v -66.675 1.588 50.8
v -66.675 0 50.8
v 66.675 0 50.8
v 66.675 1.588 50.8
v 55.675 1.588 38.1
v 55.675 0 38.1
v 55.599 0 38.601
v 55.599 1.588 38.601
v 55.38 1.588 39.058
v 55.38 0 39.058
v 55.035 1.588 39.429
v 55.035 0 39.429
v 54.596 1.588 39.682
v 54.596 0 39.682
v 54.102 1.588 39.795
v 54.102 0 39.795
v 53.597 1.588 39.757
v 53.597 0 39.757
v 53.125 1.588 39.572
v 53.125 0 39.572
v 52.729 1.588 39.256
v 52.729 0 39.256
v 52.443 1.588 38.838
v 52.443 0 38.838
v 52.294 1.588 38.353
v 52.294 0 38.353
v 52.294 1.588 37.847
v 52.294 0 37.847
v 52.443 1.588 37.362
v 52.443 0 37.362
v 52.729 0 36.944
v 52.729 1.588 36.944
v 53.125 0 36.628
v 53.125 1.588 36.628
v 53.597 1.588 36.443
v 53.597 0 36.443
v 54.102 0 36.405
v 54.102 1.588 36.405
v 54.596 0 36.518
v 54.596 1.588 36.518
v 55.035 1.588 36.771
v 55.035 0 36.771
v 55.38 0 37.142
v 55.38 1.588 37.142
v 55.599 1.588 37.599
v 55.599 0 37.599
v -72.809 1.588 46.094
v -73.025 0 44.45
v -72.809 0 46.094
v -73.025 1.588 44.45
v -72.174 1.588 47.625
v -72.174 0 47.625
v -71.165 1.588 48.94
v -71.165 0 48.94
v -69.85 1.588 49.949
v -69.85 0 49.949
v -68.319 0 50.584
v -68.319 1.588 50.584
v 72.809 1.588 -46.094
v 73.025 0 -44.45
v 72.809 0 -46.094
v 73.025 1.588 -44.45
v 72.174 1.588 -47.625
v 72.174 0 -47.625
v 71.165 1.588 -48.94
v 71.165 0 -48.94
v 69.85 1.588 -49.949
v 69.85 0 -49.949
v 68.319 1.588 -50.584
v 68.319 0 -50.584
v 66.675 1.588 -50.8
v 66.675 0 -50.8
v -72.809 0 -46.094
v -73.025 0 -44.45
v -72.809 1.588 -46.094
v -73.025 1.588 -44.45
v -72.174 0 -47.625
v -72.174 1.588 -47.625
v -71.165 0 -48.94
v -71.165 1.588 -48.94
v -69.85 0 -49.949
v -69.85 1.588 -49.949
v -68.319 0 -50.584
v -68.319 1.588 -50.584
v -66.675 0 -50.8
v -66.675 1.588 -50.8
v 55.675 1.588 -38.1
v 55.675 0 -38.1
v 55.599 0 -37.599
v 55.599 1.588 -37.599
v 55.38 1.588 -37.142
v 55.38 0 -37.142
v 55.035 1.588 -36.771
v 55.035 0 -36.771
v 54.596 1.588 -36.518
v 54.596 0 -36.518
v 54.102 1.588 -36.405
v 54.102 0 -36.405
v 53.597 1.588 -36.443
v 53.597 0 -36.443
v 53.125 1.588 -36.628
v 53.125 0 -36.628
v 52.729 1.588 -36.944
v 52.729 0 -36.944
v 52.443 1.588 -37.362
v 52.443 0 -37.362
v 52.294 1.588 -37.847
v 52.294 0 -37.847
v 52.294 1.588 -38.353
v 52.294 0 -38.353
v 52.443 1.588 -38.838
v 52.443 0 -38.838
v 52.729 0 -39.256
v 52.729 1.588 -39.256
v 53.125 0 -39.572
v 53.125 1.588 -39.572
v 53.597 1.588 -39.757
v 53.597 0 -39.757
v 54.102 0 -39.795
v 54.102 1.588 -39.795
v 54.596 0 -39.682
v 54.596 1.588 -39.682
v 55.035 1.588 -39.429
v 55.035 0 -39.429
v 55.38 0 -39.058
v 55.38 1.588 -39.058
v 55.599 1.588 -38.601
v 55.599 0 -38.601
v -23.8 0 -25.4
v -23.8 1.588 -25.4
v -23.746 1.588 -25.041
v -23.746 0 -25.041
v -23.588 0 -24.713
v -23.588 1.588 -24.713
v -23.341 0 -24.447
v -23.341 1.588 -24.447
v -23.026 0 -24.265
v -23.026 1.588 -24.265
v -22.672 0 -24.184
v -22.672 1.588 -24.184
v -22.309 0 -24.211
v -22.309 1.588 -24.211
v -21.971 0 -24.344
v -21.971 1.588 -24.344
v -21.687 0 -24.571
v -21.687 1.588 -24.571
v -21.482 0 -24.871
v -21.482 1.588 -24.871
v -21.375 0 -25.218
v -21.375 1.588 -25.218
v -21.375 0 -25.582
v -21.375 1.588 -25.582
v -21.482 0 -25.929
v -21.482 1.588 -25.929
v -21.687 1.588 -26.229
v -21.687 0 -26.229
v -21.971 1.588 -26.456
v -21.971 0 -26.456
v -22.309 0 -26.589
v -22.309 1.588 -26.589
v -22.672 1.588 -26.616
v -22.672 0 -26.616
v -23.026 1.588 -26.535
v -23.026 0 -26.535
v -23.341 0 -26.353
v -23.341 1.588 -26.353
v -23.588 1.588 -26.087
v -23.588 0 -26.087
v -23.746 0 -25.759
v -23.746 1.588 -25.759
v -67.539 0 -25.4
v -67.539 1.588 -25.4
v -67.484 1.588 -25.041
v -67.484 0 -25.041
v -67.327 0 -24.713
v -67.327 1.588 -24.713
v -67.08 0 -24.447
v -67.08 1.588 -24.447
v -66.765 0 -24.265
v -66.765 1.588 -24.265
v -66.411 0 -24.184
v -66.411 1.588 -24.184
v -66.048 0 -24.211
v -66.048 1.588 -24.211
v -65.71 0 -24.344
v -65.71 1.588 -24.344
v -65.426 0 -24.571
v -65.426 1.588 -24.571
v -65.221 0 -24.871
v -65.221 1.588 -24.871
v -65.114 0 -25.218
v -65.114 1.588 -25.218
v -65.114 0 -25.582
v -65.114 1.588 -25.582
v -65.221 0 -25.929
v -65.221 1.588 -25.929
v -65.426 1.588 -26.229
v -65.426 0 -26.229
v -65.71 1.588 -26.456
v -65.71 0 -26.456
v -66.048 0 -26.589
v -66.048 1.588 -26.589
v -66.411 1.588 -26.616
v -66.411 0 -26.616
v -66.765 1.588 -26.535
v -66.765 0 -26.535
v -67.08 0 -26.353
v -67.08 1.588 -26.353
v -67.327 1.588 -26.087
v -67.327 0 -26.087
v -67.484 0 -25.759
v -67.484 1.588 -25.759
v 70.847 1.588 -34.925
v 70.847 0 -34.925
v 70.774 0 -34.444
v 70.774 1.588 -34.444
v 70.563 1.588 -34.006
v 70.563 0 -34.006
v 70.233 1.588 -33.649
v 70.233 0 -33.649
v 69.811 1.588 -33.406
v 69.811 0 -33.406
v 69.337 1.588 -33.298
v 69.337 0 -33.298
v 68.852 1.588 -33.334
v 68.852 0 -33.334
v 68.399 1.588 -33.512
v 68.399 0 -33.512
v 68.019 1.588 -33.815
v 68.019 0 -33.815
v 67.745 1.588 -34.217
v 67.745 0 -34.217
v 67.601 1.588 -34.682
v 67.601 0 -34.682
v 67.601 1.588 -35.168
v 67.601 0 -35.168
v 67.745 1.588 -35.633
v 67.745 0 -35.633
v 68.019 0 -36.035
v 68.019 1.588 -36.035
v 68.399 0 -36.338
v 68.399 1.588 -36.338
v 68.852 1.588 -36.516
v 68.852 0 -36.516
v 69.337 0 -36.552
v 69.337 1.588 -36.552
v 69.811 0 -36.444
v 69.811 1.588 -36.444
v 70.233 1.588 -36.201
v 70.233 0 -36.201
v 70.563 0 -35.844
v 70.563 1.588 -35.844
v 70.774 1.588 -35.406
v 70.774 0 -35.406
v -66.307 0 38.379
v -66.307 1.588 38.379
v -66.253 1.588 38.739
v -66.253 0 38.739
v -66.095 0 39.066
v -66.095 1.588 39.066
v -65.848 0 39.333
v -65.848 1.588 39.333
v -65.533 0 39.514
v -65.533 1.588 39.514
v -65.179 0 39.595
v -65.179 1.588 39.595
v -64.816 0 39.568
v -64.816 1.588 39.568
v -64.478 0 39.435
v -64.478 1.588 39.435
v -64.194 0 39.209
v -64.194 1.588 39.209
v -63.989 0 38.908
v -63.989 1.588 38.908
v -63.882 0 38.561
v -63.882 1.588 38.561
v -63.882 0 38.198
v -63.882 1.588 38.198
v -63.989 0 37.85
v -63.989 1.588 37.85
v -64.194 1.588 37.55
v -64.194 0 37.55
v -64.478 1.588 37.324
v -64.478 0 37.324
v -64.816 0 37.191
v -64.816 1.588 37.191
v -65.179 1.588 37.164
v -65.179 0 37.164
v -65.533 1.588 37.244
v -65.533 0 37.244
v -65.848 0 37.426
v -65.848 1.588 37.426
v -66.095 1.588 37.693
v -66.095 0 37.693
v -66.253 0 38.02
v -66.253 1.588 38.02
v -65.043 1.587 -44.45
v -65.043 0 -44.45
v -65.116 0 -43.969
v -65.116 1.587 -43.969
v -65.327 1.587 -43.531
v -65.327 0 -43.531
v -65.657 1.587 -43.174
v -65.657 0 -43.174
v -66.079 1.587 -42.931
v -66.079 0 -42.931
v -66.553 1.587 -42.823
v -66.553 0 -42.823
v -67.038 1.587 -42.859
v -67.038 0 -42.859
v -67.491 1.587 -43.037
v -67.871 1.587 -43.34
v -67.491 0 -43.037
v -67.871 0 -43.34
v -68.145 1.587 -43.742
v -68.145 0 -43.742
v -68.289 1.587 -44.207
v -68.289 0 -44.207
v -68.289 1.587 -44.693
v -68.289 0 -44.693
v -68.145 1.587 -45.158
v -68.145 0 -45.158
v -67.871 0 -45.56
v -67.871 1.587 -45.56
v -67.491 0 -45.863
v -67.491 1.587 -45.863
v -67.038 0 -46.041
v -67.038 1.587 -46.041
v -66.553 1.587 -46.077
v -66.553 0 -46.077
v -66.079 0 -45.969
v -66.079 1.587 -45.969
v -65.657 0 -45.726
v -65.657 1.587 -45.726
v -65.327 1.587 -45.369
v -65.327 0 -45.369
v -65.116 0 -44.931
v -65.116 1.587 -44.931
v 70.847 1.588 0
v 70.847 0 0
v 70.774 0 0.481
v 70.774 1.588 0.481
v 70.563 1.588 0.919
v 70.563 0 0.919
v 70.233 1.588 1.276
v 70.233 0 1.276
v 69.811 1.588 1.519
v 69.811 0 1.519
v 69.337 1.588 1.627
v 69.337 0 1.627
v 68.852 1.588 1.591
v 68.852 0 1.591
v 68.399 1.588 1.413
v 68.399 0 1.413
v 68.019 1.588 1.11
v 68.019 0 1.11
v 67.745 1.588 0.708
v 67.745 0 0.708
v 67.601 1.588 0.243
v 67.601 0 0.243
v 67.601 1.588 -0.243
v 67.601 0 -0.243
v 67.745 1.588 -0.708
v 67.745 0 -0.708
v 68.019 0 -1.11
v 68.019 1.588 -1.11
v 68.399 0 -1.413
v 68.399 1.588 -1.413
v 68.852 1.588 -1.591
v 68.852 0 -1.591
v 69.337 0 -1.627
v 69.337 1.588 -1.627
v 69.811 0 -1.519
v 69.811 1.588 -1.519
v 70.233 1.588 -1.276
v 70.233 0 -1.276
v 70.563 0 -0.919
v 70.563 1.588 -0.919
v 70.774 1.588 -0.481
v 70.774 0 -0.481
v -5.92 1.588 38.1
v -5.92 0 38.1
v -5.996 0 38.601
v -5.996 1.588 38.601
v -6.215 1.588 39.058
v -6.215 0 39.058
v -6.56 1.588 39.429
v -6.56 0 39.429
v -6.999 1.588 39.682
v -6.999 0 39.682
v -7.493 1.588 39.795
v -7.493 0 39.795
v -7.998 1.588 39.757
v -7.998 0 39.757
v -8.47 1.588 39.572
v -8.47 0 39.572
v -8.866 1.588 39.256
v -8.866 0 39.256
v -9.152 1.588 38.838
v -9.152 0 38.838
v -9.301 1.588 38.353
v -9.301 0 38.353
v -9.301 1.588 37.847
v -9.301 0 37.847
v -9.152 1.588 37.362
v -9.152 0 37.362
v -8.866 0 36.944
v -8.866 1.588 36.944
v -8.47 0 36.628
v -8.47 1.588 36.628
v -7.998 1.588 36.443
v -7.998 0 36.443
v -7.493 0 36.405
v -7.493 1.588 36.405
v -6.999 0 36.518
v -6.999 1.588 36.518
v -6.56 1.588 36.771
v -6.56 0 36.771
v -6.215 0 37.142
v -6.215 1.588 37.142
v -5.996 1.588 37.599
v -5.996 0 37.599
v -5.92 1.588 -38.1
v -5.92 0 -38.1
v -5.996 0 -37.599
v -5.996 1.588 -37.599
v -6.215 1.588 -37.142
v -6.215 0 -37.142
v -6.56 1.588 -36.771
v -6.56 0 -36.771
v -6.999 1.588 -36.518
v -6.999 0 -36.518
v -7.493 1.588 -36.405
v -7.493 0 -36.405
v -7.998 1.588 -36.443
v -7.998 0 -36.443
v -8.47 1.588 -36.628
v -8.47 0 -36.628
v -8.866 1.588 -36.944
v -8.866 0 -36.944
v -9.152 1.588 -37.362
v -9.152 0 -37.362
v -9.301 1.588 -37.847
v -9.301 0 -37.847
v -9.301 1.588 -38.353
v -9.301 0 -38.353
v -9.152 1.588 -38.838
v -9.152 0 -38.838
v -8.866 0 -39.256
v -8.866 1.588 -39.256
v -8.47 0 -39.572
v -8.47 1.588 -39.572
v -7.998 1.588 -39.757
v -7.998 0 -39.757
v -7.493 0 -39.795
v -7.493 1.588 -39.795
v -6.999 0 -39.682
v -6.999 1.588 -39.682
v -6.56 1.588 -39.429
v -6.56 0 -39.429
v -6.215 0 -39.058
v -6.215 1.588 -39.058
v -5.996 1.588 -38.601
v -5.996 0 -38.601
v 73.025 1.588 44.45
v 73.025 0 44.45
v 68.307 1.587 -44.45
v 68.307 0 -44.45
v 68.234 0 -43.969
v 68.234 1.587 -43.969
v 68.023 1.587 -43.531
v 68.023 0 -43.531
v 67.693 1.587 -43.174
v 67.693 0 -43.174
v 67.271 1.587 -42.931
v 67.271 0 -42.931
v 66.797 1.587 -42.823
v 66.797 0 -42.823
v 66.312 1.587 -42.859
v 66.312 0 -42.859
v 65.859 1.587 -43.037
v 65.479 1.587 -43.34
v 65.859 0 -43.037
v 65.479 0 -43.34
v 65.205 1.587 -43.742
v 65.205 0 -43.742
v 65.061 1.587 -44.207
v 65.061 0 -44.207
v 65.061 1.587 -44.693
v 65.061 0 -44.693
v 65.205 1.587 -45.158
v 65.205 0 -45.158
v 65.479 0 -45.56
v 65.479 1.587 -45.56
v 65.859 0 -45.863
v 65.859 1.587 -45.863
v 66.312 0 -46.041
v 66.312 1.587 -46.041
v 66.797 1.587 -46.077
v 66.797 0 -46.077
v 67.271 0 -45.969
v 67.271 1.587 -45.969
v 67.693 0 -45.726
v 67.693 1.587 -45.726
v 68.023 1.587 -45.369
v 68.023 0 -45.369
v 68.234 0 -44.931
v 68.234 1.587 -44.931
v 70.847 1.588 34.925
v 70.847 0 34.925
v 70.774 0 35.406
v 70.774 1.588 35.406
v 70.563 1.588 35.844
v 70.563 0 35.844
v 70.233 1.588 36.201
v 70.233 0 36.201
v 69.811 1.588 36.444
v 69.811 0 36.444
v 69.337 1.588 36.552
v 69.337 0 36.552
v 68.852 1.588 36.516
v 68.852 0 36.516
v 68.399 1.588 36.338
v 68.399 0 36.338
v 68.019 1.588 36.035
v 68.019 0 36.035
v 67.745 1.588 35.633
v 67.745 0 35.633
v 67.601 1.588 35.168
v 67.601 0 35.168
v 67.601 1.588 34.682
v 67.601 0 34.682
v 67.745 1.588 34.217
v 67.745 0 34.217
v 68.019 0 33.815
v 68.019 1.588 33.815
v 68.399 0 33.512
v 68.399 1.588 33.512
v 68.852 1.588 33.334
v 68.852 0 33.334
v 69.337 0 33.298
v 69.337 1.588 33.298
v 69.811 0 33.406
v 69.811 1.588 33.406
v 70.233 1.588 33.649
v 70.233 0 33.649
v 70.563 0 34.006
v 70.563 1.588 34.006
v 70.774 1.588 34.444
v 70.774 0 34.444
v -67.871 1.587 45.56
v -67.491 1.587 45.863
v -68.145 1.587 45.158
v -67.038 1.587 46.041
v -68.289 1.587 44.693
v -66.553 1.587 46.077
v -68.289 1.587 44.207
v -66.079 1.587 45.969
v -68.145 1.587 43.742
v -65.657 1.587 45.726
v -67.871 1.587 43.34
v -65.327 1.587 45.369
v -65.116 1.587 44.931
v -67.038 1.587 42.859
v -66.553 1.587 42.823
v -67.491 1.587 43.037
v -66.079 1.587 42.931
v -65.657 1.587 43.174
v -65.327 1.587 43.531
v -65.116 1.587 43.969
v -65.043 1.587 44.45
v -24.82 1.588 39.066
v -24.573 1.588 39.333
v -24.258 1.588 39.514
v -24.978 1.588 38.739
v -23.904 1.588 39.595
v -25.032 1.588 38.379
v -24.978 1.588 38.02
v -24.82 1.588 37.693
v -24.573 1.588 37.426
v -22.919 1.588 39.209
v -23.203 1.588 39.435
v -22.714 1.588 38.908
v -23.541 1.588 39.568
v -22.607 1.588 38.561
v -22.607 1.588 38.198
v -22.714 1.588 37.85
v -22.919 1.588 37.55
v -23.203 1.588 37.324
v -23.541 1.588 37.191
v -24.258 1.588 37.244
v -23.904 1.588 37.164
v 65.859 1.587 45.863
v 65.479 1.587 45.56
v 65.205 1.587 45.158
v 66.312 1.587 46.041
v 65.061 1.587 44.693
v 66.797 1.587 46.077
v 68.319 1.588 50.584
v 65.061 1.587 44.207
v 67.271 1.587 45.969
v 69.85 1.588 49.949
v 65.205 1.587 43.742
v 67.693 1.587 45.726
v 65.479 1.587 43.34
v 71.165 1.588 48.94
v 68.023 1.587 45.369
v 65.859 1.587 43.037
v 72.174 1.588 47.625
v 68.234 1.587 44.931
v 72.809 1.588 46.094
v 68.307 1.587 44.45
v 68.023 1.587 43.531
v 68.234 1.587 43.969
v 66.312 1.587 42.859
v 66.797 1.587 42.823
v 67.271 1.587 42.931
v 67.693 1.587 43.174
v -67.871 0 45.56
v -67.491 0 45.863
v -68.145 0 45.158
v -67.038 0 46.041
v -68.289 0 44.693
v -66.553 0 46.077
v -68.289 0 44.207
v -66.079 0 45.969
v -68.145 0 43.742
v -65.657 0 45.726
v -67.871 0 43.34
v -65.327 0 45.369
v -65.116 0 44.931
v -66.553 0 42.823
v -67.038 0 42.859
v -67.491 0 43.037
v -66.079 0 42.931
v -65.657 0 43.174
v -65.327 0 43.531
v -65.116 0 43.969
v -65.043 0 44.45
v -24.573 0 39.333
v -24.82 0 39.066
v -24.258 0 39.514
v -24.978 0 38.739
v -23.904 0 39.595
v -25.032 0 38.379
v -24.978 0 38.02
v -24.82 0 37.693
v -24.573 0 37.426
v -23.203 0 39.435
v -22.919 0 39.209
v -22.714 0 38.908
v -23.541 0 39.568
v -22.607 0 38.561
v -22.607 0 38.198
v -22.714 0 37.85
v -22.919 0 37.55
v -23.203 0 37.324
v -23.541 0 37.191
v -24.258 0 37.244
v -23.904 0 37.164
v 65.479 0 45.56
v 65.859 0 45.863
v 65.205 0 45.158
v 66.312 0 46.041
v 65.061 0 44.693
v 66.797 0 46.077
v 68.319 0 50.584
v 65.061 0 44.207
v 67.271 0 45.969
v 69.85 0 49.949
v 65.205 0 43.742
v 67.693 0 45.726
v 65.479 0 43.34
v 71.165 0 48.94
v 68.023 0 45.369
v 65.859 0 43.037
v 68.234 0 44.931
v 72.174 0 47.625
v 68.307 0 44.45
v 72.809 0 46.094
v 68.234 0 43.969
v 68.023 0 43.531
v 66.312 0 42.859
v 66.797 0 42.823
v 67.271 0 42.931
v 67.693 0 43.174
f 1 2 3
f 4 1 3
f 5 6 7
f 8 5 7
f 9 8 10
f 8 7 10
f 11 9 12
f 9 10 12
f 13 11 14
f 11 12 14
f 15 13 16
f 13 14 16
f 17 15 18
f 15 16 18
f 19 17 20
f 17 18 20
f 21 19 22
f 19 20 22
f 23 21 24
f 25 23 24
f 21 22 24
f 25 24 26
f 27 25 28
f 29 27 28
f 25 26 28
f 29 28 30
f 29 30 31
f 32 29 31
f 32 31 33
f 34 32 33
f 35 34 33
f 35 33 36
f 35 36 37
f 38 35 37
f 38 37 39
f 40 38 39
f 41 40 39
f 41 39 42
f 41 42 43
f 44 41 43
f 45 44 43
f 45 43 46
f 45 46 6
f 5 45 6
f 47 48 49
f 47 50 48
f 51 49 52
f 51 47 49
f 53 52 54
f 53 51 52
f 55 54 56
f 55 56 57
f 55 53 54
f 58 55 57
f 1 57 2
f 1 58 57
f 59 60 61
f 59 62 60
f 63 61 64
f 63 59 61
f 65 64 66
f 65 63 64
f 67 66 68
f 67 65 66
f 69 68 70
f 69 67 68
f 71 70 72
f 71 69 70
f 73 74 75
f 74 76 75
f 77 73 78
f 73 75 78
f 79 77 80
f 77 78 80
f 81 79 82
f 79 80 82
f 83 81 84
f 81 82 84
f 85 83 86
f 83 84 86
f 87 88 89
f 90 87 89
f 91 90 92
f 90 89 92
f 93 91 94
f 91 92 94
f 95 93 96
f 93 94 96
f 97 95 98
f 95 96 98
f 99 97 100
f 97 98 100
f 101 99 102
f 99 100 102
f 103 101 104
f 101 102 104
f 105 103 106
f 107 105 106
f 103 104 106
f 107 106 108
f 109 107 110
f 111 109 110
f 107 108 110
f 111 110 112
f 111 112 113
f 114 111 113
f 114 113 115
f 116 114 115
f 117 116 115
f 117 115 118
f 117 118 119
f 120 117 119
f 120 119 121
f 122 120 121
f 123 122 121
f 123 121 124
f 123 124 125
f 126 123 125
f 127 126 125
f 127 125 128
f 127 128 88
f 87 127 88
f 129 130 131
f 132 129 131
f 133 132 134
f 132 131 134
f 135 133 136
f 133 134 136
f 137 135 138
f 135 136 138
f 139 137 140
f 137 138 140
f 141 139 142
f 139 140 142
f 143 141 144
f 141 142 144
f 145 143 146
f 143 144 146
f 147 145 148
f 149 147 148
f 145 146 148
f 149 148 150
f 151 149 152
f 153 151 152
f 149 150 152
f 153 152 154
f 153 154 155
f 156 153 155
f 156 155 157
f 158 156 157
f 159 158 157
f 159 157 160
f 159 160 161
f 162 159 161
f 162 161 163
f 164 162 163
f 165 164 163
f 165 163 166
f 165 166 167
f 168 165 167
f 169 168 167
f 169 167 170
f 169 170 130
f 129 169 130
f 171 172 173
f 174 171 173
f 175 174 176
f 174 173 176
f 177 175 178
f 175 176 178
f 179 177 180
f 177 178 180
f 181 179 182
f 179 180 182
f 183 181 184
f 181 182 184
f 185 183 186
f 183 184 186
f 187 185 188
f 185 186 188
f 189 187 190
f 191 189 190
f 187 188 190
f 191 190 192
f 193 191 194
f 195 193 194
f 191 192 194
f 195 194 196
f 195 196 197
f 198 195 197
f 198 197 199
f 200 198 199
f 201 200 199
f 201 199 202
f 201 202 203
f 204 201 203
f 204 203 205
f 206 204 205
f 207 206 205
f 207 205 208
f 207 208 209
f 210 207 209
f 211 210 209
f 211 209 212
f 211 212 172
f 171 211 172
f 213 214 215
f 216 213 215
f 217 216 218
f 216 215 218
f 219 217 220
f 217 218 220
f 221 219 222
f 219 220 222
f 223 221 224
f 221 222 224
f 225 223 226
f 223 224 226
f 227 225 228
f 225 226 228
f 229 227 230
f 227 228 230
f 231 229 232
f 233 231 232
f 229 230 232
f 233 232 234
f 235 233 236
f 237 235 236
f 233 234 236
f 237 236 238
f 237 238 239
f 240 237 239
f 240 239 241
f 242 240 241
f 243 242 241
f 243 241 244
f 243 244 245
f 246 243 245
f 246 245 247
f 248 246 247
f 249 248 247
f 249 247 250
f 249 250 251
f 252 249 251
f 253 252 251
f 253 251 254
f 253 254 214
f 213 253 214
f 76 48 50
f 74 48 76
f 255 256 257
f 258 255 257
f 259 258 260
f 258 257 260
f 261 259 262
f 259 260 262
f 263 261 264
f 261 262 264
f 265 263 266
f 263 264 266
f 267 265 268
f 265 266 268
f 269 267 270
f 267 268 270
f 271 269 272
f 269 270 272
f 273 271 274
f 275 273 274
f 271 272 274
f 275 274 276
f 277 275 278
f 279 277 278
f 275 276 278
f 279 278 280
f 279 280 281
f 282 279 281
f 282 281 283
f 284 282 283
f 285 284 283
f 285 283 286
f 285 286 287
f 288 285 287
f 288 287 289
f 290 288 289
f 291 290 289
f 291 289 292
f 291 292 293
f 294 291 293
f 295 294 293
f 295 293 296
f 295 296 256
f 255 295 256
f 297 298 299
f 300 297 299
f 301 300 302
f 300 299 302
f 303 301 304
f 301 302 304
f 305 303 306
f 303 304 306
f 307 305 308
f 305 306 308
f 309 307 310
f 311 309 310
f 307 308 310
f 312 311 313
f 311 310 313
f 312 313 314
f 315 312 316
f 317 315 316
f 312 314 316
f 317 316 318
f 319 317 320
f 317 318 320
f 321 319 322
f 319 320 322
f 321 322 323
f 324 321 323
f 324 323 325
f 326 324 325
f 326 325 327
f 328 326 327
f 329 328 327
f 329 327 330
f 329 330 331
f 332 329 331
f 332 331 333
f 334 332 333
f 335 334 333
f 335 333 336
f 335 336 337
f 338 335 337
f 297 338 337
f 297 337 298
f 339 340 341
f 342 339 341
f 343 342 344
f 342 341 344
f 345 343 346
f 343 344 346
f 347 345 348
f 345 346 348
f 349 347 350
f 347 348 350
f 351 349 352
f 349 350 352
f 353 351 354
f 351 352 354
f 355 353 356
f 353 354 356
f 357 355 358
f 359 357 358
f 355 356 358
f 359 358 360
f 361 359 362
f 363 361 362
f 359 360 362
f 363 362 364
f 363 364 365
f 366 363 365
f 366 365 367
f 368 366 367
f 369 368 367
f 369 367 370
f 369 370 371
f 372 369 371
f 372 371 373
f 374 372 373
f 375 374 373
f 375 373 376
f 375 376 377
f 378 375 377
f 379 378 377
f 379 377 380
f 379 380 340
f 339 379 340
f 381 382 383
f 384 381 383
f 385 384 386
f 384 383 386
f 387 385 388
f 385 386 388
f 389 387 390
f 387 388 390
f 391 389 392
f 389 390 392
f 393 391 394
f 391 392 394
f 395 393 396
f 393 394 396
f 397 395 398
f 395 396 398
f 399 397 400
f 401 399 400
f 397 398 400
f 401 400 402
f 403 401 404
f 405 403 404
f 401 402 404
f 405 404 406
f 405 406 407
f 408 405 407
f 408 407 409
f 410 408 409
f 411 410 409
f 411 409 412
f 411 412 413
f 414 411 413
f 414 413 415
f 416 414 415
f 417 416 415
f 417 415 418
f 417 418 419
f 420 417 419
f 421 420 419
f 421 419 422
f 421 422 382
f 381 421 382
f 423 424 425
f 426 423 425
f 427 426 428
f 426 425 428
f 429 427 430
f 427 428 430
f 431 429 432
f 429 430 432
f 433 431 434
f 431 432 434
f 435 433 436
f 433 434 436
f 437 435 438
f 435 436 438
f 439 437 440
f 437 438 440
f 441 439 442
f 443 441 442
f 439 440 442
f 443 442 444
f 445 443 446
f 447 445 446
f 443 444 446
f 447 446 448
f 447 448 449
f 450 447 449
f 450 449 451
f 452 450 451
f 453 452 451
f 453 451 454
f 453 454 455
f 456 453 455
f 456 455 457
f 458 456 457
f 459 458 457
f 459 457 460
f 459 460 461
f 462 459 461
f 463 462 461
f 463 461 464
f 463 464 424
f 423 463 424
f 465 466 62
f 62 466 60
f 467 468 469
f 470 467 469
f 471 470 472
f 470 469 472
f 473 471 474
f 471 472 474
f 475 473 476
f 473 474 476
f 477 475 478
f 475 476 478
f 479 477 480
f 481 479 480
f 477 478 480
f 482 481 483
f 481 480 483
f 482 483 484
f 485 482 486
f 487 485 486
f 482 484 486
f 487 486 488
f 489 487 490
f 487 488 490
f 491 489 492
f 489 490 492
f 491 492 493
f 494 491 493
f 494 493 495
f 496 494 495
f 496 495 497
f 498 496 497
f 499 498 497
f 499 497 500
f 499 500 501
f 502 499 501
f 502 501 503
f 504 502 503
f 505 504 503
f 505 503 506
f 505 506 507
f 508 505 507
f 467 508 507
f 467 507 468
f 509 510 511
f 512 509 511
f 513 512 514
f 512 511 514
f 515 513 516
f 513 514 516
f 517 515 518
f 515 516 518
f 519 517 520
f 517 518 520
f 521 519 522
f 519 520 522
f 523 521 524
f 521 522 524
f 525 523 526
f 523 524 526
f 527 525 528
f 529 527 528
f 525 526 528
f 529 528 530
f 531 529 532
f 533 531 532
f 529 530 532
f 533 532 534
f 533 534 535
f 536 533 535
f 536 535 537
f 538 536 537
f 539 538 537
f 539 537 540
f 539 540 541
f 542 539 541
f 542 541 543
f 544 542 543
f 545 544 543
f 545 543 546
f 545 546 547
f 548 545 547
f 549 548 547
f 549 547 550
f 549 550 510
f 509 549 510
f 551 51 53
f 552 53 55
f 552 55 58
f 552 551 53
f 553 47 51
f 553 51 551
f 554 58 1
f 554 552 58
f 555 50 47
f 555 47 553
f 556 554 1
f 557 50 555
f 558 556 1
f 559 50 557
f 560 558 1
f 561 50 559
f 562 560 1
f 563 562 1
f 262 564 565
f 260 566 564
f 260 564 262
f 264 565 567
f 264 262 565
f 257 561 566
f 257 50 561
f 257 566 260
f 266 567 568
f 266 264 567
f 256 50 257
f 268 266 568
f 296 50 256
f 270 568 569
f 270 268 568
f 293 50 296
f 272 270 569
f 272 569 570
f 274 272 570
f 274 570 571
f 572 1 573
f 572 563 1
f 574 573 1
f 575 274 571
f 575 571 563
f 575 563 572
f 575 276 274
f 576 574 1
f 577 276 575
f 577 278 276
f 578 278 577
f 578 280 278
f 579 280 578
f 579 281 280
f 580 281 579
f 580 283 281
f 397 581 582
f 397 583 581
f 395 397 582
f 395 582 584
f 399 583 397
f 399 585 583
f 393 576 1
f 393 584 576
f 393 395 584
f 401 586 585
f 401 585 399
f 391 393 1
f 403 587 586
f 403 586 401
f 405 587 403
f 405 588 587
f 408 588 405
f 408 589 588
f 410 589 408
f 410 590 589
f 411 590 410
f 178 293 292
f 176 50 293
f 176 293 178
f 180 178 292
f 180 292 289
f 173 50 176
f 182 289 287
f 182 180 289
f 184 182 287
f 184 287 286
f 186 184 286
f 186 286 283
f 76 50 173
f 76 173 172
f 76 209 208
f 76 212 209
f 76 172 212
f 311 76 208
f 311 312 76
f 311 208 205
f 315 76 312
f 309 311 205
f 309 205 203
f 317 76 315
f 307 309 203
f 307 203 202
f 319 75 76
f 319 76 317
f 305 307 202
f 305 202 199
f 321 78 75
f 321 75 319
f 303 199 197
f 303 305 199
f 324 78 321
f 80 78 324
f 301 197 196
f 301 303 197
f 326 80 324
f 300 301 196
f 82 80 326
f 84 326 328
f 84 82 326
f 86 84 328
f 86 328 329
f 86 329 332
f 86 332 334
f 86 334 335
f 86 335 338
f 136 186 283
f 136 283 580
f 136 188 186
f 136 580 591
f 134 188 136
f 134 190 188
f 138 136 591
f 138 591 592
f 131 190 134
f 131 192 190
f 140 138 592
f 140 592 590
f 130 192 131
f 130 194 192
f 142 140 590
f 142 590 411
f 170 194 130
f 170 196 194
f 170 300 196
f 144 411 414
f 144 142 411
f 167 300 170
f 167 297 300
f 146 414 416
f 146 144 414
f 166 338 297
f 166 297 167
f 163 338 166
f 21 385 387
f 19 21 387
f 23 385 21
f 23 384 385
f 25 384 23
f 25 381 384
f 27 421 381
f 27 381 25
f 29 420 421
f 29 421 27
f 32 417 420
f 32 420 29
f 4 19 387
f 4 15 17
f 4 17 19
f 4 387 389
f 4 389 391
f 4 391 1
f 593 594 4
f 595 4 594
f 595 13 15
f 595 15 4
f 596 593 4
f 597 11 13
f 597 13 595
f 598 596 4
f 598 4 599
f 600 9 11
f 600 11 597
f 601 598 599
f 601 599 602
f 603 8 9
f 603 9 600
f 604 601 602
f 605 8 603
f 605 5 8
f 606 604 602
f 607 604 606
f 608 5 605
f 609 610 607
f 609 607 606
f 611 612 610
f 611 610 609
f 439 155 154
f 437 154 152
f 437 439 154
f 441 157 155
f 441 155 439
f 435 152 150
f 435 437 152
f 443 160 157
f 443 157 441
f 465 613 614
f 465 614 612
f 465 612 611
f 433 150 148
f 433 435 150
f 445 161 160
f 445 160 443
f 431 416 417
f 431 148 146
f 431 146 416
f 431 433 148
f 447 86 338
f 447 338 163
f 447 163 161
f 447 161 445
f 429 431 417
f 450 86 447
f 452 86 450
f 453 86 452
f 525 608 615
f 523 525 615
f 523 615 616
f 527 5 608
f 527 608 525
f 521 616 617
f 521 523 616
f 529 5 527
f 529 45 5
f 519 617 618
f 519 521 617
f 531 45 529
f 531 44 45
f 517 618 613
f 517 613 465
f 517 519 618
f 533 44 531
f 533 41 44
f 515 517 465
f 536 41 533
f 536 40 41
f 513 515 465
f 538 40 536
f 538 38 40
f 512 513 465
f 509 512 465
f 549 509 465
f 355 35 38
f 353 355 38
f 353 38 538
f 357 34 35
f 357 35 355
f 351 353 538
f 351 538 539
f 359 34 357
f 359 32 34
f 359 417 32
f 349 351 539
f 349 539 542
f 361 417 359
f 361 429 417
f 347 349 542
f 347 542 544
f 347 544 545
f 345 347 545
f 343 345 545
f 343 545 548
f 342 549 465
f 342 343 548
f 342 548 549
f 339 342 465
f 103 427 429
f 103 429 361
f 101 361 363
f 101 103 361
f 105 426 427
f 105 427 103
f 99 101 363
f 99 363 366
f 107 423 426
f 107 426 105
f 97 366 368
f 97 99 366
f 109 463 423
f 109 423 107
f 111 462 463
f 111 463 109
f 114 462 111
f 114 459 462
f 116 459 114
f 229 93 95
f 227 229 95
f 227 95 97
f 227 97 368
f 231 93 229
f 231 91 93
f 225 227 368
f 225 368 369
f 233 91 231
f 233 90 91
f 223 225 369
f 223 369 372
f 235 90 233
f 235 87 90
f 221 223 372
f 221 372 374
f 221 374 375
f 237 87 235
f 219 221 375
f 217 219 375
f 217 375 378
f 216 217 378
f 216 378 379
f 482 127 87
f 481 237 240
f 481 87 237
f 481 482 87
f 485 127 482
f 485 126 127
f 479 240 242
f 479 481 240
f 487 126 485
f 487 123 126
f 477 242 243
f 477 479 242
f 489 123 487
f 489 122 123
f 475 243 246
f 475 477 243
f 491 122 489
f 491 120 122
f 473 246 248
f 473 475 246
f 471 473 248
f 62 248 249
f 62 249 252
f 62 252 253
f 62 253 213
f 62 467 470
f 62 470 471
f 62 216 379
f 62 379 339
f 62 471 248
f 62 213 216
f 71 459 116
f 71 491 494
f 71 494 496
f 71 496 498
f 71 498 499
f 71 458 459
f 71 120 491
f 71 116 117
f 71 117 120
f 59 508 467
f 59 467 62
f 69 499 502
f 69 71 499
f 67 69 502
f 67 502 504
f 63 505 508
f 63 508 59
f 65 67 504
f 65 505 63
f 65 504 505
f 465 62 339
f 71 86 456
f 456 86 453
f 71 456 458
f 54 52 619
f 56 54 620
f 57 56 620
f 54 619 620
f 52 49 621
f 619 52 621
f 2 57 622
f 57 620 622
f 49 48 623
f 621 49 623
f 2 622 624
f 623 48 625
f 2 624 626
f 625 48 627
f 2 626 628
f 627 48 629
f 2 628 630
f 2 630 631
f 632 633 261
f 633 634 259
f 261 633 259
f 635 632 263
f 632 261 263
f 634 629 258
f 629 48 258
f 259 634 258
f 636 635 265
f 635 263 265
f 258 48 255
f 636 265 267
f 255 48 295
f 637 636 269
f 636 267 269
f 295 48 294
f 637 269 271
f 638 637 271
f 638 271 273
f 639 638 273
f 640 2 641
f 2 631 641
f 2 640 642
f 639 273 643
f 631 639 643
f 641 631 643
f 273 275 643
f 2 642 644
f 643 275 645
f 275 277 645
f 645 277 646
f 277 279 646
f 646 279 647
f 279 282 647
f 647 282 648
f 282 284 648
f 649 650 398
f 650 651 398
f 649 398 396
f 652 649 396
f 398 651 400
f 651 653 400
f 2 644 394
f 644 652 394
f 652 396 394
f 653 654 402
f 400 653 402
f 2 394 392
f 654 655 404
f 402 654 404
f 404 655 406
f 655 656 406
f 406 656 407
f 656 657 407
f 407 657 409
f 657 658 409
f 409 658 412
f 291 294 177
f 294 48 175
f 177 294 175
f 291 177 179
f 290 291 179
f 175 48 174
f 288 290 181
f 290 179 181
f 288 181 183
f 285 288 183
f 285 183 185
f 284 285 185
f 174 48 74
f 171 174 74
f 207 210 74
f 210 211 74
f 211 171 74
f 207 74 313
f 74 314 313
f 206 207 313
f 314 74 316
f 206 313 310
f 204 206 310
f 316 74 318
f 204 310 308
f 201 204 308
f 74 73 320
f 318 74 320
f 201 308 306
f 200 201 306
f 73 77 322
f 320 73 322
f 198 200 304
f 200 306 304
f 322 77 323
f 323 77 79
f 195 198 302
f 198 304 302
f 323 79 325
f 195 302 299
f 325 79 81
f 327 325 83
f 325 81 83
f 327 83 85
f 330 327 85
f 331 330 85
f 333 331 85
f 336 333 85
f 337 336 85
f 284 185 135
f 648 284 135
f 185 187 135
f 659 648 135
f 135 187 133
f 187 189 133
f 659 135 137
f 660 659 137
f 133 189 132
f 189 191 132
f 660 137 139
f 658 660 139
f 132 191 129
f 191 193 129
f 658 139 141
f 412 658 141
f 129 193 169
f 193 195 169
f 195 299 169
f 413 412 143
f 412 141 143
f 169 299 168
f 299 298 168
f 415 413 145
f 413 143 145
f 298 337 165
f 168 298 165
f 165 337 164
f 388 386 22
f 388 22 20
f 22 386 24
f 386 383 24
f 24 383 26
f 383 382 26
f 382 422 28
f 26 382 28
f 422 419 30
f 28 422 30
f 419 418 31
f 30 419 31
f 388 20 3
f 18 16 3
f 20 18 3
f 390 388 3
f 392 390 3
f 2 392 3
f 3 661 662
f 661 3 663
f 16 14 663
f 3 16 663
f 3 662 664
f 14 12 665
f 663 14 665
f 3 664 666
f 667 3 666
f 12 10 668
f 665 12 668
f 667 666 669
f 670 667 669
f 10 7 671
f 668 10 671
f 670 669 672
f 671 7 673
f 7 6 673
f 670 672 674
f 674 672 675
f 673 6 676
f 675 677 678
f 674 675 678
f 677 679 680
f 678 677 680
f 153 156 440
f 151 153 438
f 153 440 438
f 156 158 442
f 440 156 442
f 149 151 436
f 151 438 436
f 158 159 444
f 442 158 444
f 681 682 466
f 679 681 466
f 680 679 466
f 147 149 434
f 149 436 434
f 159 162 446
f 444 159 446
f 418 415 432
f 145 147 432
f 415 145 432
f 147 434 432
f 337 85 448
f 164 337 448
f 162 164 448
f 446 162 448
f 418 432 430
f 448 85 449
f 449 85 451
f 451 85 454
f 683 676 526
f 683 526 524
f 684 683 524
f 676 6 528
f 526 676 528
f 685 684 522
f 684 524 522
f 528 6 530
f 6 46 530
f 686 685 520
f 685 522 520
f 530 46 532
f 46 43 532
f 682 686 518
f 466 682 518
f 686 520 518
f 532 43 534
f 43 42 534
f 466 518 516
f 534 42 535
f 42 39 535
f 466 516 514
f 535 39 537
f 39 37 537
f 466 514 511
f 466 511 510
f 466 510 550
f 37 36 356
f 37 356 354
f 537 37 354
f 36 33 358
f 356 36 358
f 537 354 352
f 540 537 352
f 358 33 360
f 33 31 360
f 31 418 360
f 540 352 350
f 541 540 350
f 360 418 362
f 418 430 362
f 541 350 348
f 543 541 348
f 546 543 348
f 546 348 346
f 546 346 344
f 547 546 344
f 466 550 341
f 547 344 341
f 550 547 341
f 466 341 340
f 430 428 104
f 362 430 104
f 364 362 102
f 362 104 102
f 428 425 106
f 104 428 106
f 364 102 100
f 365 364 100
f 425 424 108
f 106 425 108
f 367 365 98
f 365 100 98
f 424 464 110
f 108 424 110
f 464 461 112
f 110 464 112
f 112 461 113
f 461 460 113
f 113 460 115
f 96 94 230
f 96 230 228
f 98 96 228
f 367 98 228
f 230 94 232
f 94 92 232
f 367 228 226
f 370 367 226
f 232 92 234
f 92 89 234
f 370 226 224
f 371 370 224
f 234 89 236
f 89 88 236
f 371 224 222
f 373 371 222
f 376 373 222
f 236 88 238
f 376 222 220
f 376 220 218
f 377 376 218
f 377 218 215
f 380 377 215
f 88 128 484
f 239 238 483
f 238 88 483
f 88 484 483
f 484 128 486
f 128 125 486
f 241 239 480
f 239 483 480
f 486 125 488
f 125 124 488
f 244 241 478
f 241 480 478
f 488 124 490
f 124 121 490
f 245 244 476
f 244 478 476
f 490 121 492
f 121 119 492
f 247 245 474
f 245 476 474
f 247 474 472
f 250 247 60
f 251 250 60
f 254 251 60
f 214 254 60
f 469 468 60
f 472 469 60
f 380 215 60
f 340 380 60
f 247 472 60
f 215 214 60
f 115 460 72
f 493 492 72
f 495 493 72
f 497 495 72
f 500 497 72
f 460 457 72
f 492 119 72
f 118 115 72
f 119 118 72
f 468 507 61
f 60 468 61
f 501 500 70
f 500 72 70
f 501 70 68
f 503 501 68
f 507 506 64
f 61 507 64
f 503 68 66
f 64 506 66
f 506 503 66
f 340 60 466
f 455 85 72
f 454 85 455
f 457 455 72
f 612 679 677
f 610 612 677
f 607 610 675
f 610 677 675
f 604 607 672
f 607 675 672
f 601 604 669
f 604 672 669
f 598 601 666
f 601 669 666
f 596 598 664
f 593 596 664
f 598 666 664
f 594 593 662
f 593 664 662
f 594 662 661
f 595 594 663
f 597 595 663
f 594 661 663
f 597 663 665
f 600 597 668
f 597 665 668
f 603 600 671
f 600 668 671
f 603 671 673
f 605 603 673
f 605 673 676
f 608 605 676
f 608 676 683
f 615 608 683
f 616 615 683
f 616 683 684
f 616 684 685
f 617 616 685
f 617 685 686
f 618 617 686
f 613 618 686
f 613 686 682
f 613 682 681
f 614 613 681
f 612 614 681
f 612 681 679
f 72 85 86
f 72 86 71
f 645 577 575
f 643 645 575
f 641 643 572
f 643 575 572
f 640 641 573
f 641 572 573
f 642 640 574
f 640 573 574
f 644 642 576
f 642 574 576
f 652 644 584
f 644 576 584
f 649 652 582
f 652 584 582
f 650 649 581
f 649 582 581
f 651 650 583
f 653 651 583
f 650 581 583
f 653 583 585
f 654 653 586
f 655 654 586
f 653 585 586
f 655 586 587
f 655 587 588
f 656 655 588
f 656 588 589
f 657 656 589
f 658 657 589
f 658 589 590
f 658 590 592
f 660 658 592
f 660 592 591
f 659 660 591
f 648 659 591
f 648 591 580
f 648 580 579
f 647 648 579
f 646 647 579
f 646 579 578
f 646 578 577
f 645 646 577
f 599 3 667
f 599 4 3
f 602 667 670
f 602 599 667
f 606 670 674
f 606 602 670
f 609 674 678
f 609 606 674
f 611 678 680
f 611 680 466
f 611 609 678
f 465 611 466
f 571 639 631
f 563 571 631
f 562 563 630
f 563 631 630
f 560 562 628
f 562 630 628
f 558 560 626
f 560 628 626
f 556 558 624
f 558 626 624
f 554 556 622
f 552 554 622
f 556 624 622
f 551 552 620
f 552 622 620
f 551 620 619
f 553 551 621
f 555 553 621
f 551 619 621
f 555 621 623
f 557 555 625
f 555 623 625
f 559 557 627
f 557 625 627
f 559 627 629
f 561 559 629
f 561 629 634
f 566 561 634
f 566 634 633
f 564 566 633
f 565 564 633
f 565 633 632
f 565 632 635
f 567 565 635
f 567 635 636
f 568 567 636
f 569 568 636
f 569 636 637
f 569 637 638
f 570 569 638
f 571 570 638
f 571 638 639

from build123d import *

# Parameters (mm, degrees)
SKETCH1_W                 = 146.05
SKETCH1_H                 = 101.6
BOSS_EXTRUDE1_DEPTH       = 1.5875
FILLET1_R                 = 6.35
F_4_CLEARANCE_HOLE1_D     = 3.2639
F_4_CLEARANCE_HOLE1_DEPTH = 50.8
F_4_CLEARANCE_HOLE1_TIP   = 0.980574487
M3_CLEARANCE_HOLE1_D      = 3.4
F_4_CLEARANCE_HOLE2_D     = 3.2639
F_2_CLEARANCE_HOLE1_D     = 2.4384


with BuildPart() as part:
    # Sketch1 → Boss-Extrude1 (new body)
    with BuildSketch(Plane(origin=(0, 0, 0), x_dir=(1, 0, 0), z_dir=(0, 1, 0))):
        Rectangle(SKETCH1_W, SKETCH1_H)
    extrude(amount=BOSS_EXTRUDE1_DEPTH)

    # Fillet1
    fillet1_edges = [part.edges().sort_by_distance(p)[0] for p in [
        (73.025, 0.79375, 50.8),
        (-73.025, 0.79375, 50.8),
        (-73.025, 0.79375, -50.8),
        (73.025, 0.79375, -50.8),
    ]]
    fillet(fillet1_edges, radius=FILLET1_R)

    # #4 Clearance Hole1
    with Locations(Plane(origin=(0, 1.5875, 0), x_dir=(-1, 0, 0), z_dir=(0, 1, 0))):
        with Locations((-66.675, 44.45), (-66.675, -44.45), (66.675, -44.45), (66.675, 44.45)):
            Hole(F_4_CLEARANCE_HOLE1_D / 2, depth=F_4_CLEARANCE_HOLE1_DEPTH)
            with Locations((0, 0, -(F_4_CLEARANCE_HOLE1_DEPTH + F_4_CLEARANCE_HOLE1_TIP / 2))):  # 118° drill point
                Cone(0, F_4_CLEARANCE_HOLE1_D / 2, F_4_CLEARANCE_HOLE1_TIP, mode=Mode.SUBTRACT)

    # M3 Clearance Hole1 (through all)
    with Locations(Plane(origin=(0, 1.5875, 0), x_dir=(-1, 0, 0), z_dir=(0, 1, 0))):
        with Locations((7.62, -38.1), (-53.975, -38.1), (7.62, 38.1), (-53.975, 38.1)):
            Hole(M3_CLEARANCE_HOLE1_D / 2)

    # #4 Clearance Hole2 (through all)
    with Locations(Plane(origin=(0, 1.5875, 0), x_dir=(-1, 0, 0), z_dir=(0, 1, 0))):
        with Locations((-69.215, 0), (-69.215, 34.925), (-69.215, -34.925)):
            Hole(F_4_CLEARANCE_HOLE2_D / 2)

    # #2 Clearance Hole1 (through all)
    with Locations(Plane.XZ):
        with Locations((-66.3194, -25.4), (-22.5806, -25.4), (-65.0875, 38.3794), (-23.8125, 38.3794)):
            Hole(F_2_CLEARANCE_HOLE1_D / 2)


solid = part.part
